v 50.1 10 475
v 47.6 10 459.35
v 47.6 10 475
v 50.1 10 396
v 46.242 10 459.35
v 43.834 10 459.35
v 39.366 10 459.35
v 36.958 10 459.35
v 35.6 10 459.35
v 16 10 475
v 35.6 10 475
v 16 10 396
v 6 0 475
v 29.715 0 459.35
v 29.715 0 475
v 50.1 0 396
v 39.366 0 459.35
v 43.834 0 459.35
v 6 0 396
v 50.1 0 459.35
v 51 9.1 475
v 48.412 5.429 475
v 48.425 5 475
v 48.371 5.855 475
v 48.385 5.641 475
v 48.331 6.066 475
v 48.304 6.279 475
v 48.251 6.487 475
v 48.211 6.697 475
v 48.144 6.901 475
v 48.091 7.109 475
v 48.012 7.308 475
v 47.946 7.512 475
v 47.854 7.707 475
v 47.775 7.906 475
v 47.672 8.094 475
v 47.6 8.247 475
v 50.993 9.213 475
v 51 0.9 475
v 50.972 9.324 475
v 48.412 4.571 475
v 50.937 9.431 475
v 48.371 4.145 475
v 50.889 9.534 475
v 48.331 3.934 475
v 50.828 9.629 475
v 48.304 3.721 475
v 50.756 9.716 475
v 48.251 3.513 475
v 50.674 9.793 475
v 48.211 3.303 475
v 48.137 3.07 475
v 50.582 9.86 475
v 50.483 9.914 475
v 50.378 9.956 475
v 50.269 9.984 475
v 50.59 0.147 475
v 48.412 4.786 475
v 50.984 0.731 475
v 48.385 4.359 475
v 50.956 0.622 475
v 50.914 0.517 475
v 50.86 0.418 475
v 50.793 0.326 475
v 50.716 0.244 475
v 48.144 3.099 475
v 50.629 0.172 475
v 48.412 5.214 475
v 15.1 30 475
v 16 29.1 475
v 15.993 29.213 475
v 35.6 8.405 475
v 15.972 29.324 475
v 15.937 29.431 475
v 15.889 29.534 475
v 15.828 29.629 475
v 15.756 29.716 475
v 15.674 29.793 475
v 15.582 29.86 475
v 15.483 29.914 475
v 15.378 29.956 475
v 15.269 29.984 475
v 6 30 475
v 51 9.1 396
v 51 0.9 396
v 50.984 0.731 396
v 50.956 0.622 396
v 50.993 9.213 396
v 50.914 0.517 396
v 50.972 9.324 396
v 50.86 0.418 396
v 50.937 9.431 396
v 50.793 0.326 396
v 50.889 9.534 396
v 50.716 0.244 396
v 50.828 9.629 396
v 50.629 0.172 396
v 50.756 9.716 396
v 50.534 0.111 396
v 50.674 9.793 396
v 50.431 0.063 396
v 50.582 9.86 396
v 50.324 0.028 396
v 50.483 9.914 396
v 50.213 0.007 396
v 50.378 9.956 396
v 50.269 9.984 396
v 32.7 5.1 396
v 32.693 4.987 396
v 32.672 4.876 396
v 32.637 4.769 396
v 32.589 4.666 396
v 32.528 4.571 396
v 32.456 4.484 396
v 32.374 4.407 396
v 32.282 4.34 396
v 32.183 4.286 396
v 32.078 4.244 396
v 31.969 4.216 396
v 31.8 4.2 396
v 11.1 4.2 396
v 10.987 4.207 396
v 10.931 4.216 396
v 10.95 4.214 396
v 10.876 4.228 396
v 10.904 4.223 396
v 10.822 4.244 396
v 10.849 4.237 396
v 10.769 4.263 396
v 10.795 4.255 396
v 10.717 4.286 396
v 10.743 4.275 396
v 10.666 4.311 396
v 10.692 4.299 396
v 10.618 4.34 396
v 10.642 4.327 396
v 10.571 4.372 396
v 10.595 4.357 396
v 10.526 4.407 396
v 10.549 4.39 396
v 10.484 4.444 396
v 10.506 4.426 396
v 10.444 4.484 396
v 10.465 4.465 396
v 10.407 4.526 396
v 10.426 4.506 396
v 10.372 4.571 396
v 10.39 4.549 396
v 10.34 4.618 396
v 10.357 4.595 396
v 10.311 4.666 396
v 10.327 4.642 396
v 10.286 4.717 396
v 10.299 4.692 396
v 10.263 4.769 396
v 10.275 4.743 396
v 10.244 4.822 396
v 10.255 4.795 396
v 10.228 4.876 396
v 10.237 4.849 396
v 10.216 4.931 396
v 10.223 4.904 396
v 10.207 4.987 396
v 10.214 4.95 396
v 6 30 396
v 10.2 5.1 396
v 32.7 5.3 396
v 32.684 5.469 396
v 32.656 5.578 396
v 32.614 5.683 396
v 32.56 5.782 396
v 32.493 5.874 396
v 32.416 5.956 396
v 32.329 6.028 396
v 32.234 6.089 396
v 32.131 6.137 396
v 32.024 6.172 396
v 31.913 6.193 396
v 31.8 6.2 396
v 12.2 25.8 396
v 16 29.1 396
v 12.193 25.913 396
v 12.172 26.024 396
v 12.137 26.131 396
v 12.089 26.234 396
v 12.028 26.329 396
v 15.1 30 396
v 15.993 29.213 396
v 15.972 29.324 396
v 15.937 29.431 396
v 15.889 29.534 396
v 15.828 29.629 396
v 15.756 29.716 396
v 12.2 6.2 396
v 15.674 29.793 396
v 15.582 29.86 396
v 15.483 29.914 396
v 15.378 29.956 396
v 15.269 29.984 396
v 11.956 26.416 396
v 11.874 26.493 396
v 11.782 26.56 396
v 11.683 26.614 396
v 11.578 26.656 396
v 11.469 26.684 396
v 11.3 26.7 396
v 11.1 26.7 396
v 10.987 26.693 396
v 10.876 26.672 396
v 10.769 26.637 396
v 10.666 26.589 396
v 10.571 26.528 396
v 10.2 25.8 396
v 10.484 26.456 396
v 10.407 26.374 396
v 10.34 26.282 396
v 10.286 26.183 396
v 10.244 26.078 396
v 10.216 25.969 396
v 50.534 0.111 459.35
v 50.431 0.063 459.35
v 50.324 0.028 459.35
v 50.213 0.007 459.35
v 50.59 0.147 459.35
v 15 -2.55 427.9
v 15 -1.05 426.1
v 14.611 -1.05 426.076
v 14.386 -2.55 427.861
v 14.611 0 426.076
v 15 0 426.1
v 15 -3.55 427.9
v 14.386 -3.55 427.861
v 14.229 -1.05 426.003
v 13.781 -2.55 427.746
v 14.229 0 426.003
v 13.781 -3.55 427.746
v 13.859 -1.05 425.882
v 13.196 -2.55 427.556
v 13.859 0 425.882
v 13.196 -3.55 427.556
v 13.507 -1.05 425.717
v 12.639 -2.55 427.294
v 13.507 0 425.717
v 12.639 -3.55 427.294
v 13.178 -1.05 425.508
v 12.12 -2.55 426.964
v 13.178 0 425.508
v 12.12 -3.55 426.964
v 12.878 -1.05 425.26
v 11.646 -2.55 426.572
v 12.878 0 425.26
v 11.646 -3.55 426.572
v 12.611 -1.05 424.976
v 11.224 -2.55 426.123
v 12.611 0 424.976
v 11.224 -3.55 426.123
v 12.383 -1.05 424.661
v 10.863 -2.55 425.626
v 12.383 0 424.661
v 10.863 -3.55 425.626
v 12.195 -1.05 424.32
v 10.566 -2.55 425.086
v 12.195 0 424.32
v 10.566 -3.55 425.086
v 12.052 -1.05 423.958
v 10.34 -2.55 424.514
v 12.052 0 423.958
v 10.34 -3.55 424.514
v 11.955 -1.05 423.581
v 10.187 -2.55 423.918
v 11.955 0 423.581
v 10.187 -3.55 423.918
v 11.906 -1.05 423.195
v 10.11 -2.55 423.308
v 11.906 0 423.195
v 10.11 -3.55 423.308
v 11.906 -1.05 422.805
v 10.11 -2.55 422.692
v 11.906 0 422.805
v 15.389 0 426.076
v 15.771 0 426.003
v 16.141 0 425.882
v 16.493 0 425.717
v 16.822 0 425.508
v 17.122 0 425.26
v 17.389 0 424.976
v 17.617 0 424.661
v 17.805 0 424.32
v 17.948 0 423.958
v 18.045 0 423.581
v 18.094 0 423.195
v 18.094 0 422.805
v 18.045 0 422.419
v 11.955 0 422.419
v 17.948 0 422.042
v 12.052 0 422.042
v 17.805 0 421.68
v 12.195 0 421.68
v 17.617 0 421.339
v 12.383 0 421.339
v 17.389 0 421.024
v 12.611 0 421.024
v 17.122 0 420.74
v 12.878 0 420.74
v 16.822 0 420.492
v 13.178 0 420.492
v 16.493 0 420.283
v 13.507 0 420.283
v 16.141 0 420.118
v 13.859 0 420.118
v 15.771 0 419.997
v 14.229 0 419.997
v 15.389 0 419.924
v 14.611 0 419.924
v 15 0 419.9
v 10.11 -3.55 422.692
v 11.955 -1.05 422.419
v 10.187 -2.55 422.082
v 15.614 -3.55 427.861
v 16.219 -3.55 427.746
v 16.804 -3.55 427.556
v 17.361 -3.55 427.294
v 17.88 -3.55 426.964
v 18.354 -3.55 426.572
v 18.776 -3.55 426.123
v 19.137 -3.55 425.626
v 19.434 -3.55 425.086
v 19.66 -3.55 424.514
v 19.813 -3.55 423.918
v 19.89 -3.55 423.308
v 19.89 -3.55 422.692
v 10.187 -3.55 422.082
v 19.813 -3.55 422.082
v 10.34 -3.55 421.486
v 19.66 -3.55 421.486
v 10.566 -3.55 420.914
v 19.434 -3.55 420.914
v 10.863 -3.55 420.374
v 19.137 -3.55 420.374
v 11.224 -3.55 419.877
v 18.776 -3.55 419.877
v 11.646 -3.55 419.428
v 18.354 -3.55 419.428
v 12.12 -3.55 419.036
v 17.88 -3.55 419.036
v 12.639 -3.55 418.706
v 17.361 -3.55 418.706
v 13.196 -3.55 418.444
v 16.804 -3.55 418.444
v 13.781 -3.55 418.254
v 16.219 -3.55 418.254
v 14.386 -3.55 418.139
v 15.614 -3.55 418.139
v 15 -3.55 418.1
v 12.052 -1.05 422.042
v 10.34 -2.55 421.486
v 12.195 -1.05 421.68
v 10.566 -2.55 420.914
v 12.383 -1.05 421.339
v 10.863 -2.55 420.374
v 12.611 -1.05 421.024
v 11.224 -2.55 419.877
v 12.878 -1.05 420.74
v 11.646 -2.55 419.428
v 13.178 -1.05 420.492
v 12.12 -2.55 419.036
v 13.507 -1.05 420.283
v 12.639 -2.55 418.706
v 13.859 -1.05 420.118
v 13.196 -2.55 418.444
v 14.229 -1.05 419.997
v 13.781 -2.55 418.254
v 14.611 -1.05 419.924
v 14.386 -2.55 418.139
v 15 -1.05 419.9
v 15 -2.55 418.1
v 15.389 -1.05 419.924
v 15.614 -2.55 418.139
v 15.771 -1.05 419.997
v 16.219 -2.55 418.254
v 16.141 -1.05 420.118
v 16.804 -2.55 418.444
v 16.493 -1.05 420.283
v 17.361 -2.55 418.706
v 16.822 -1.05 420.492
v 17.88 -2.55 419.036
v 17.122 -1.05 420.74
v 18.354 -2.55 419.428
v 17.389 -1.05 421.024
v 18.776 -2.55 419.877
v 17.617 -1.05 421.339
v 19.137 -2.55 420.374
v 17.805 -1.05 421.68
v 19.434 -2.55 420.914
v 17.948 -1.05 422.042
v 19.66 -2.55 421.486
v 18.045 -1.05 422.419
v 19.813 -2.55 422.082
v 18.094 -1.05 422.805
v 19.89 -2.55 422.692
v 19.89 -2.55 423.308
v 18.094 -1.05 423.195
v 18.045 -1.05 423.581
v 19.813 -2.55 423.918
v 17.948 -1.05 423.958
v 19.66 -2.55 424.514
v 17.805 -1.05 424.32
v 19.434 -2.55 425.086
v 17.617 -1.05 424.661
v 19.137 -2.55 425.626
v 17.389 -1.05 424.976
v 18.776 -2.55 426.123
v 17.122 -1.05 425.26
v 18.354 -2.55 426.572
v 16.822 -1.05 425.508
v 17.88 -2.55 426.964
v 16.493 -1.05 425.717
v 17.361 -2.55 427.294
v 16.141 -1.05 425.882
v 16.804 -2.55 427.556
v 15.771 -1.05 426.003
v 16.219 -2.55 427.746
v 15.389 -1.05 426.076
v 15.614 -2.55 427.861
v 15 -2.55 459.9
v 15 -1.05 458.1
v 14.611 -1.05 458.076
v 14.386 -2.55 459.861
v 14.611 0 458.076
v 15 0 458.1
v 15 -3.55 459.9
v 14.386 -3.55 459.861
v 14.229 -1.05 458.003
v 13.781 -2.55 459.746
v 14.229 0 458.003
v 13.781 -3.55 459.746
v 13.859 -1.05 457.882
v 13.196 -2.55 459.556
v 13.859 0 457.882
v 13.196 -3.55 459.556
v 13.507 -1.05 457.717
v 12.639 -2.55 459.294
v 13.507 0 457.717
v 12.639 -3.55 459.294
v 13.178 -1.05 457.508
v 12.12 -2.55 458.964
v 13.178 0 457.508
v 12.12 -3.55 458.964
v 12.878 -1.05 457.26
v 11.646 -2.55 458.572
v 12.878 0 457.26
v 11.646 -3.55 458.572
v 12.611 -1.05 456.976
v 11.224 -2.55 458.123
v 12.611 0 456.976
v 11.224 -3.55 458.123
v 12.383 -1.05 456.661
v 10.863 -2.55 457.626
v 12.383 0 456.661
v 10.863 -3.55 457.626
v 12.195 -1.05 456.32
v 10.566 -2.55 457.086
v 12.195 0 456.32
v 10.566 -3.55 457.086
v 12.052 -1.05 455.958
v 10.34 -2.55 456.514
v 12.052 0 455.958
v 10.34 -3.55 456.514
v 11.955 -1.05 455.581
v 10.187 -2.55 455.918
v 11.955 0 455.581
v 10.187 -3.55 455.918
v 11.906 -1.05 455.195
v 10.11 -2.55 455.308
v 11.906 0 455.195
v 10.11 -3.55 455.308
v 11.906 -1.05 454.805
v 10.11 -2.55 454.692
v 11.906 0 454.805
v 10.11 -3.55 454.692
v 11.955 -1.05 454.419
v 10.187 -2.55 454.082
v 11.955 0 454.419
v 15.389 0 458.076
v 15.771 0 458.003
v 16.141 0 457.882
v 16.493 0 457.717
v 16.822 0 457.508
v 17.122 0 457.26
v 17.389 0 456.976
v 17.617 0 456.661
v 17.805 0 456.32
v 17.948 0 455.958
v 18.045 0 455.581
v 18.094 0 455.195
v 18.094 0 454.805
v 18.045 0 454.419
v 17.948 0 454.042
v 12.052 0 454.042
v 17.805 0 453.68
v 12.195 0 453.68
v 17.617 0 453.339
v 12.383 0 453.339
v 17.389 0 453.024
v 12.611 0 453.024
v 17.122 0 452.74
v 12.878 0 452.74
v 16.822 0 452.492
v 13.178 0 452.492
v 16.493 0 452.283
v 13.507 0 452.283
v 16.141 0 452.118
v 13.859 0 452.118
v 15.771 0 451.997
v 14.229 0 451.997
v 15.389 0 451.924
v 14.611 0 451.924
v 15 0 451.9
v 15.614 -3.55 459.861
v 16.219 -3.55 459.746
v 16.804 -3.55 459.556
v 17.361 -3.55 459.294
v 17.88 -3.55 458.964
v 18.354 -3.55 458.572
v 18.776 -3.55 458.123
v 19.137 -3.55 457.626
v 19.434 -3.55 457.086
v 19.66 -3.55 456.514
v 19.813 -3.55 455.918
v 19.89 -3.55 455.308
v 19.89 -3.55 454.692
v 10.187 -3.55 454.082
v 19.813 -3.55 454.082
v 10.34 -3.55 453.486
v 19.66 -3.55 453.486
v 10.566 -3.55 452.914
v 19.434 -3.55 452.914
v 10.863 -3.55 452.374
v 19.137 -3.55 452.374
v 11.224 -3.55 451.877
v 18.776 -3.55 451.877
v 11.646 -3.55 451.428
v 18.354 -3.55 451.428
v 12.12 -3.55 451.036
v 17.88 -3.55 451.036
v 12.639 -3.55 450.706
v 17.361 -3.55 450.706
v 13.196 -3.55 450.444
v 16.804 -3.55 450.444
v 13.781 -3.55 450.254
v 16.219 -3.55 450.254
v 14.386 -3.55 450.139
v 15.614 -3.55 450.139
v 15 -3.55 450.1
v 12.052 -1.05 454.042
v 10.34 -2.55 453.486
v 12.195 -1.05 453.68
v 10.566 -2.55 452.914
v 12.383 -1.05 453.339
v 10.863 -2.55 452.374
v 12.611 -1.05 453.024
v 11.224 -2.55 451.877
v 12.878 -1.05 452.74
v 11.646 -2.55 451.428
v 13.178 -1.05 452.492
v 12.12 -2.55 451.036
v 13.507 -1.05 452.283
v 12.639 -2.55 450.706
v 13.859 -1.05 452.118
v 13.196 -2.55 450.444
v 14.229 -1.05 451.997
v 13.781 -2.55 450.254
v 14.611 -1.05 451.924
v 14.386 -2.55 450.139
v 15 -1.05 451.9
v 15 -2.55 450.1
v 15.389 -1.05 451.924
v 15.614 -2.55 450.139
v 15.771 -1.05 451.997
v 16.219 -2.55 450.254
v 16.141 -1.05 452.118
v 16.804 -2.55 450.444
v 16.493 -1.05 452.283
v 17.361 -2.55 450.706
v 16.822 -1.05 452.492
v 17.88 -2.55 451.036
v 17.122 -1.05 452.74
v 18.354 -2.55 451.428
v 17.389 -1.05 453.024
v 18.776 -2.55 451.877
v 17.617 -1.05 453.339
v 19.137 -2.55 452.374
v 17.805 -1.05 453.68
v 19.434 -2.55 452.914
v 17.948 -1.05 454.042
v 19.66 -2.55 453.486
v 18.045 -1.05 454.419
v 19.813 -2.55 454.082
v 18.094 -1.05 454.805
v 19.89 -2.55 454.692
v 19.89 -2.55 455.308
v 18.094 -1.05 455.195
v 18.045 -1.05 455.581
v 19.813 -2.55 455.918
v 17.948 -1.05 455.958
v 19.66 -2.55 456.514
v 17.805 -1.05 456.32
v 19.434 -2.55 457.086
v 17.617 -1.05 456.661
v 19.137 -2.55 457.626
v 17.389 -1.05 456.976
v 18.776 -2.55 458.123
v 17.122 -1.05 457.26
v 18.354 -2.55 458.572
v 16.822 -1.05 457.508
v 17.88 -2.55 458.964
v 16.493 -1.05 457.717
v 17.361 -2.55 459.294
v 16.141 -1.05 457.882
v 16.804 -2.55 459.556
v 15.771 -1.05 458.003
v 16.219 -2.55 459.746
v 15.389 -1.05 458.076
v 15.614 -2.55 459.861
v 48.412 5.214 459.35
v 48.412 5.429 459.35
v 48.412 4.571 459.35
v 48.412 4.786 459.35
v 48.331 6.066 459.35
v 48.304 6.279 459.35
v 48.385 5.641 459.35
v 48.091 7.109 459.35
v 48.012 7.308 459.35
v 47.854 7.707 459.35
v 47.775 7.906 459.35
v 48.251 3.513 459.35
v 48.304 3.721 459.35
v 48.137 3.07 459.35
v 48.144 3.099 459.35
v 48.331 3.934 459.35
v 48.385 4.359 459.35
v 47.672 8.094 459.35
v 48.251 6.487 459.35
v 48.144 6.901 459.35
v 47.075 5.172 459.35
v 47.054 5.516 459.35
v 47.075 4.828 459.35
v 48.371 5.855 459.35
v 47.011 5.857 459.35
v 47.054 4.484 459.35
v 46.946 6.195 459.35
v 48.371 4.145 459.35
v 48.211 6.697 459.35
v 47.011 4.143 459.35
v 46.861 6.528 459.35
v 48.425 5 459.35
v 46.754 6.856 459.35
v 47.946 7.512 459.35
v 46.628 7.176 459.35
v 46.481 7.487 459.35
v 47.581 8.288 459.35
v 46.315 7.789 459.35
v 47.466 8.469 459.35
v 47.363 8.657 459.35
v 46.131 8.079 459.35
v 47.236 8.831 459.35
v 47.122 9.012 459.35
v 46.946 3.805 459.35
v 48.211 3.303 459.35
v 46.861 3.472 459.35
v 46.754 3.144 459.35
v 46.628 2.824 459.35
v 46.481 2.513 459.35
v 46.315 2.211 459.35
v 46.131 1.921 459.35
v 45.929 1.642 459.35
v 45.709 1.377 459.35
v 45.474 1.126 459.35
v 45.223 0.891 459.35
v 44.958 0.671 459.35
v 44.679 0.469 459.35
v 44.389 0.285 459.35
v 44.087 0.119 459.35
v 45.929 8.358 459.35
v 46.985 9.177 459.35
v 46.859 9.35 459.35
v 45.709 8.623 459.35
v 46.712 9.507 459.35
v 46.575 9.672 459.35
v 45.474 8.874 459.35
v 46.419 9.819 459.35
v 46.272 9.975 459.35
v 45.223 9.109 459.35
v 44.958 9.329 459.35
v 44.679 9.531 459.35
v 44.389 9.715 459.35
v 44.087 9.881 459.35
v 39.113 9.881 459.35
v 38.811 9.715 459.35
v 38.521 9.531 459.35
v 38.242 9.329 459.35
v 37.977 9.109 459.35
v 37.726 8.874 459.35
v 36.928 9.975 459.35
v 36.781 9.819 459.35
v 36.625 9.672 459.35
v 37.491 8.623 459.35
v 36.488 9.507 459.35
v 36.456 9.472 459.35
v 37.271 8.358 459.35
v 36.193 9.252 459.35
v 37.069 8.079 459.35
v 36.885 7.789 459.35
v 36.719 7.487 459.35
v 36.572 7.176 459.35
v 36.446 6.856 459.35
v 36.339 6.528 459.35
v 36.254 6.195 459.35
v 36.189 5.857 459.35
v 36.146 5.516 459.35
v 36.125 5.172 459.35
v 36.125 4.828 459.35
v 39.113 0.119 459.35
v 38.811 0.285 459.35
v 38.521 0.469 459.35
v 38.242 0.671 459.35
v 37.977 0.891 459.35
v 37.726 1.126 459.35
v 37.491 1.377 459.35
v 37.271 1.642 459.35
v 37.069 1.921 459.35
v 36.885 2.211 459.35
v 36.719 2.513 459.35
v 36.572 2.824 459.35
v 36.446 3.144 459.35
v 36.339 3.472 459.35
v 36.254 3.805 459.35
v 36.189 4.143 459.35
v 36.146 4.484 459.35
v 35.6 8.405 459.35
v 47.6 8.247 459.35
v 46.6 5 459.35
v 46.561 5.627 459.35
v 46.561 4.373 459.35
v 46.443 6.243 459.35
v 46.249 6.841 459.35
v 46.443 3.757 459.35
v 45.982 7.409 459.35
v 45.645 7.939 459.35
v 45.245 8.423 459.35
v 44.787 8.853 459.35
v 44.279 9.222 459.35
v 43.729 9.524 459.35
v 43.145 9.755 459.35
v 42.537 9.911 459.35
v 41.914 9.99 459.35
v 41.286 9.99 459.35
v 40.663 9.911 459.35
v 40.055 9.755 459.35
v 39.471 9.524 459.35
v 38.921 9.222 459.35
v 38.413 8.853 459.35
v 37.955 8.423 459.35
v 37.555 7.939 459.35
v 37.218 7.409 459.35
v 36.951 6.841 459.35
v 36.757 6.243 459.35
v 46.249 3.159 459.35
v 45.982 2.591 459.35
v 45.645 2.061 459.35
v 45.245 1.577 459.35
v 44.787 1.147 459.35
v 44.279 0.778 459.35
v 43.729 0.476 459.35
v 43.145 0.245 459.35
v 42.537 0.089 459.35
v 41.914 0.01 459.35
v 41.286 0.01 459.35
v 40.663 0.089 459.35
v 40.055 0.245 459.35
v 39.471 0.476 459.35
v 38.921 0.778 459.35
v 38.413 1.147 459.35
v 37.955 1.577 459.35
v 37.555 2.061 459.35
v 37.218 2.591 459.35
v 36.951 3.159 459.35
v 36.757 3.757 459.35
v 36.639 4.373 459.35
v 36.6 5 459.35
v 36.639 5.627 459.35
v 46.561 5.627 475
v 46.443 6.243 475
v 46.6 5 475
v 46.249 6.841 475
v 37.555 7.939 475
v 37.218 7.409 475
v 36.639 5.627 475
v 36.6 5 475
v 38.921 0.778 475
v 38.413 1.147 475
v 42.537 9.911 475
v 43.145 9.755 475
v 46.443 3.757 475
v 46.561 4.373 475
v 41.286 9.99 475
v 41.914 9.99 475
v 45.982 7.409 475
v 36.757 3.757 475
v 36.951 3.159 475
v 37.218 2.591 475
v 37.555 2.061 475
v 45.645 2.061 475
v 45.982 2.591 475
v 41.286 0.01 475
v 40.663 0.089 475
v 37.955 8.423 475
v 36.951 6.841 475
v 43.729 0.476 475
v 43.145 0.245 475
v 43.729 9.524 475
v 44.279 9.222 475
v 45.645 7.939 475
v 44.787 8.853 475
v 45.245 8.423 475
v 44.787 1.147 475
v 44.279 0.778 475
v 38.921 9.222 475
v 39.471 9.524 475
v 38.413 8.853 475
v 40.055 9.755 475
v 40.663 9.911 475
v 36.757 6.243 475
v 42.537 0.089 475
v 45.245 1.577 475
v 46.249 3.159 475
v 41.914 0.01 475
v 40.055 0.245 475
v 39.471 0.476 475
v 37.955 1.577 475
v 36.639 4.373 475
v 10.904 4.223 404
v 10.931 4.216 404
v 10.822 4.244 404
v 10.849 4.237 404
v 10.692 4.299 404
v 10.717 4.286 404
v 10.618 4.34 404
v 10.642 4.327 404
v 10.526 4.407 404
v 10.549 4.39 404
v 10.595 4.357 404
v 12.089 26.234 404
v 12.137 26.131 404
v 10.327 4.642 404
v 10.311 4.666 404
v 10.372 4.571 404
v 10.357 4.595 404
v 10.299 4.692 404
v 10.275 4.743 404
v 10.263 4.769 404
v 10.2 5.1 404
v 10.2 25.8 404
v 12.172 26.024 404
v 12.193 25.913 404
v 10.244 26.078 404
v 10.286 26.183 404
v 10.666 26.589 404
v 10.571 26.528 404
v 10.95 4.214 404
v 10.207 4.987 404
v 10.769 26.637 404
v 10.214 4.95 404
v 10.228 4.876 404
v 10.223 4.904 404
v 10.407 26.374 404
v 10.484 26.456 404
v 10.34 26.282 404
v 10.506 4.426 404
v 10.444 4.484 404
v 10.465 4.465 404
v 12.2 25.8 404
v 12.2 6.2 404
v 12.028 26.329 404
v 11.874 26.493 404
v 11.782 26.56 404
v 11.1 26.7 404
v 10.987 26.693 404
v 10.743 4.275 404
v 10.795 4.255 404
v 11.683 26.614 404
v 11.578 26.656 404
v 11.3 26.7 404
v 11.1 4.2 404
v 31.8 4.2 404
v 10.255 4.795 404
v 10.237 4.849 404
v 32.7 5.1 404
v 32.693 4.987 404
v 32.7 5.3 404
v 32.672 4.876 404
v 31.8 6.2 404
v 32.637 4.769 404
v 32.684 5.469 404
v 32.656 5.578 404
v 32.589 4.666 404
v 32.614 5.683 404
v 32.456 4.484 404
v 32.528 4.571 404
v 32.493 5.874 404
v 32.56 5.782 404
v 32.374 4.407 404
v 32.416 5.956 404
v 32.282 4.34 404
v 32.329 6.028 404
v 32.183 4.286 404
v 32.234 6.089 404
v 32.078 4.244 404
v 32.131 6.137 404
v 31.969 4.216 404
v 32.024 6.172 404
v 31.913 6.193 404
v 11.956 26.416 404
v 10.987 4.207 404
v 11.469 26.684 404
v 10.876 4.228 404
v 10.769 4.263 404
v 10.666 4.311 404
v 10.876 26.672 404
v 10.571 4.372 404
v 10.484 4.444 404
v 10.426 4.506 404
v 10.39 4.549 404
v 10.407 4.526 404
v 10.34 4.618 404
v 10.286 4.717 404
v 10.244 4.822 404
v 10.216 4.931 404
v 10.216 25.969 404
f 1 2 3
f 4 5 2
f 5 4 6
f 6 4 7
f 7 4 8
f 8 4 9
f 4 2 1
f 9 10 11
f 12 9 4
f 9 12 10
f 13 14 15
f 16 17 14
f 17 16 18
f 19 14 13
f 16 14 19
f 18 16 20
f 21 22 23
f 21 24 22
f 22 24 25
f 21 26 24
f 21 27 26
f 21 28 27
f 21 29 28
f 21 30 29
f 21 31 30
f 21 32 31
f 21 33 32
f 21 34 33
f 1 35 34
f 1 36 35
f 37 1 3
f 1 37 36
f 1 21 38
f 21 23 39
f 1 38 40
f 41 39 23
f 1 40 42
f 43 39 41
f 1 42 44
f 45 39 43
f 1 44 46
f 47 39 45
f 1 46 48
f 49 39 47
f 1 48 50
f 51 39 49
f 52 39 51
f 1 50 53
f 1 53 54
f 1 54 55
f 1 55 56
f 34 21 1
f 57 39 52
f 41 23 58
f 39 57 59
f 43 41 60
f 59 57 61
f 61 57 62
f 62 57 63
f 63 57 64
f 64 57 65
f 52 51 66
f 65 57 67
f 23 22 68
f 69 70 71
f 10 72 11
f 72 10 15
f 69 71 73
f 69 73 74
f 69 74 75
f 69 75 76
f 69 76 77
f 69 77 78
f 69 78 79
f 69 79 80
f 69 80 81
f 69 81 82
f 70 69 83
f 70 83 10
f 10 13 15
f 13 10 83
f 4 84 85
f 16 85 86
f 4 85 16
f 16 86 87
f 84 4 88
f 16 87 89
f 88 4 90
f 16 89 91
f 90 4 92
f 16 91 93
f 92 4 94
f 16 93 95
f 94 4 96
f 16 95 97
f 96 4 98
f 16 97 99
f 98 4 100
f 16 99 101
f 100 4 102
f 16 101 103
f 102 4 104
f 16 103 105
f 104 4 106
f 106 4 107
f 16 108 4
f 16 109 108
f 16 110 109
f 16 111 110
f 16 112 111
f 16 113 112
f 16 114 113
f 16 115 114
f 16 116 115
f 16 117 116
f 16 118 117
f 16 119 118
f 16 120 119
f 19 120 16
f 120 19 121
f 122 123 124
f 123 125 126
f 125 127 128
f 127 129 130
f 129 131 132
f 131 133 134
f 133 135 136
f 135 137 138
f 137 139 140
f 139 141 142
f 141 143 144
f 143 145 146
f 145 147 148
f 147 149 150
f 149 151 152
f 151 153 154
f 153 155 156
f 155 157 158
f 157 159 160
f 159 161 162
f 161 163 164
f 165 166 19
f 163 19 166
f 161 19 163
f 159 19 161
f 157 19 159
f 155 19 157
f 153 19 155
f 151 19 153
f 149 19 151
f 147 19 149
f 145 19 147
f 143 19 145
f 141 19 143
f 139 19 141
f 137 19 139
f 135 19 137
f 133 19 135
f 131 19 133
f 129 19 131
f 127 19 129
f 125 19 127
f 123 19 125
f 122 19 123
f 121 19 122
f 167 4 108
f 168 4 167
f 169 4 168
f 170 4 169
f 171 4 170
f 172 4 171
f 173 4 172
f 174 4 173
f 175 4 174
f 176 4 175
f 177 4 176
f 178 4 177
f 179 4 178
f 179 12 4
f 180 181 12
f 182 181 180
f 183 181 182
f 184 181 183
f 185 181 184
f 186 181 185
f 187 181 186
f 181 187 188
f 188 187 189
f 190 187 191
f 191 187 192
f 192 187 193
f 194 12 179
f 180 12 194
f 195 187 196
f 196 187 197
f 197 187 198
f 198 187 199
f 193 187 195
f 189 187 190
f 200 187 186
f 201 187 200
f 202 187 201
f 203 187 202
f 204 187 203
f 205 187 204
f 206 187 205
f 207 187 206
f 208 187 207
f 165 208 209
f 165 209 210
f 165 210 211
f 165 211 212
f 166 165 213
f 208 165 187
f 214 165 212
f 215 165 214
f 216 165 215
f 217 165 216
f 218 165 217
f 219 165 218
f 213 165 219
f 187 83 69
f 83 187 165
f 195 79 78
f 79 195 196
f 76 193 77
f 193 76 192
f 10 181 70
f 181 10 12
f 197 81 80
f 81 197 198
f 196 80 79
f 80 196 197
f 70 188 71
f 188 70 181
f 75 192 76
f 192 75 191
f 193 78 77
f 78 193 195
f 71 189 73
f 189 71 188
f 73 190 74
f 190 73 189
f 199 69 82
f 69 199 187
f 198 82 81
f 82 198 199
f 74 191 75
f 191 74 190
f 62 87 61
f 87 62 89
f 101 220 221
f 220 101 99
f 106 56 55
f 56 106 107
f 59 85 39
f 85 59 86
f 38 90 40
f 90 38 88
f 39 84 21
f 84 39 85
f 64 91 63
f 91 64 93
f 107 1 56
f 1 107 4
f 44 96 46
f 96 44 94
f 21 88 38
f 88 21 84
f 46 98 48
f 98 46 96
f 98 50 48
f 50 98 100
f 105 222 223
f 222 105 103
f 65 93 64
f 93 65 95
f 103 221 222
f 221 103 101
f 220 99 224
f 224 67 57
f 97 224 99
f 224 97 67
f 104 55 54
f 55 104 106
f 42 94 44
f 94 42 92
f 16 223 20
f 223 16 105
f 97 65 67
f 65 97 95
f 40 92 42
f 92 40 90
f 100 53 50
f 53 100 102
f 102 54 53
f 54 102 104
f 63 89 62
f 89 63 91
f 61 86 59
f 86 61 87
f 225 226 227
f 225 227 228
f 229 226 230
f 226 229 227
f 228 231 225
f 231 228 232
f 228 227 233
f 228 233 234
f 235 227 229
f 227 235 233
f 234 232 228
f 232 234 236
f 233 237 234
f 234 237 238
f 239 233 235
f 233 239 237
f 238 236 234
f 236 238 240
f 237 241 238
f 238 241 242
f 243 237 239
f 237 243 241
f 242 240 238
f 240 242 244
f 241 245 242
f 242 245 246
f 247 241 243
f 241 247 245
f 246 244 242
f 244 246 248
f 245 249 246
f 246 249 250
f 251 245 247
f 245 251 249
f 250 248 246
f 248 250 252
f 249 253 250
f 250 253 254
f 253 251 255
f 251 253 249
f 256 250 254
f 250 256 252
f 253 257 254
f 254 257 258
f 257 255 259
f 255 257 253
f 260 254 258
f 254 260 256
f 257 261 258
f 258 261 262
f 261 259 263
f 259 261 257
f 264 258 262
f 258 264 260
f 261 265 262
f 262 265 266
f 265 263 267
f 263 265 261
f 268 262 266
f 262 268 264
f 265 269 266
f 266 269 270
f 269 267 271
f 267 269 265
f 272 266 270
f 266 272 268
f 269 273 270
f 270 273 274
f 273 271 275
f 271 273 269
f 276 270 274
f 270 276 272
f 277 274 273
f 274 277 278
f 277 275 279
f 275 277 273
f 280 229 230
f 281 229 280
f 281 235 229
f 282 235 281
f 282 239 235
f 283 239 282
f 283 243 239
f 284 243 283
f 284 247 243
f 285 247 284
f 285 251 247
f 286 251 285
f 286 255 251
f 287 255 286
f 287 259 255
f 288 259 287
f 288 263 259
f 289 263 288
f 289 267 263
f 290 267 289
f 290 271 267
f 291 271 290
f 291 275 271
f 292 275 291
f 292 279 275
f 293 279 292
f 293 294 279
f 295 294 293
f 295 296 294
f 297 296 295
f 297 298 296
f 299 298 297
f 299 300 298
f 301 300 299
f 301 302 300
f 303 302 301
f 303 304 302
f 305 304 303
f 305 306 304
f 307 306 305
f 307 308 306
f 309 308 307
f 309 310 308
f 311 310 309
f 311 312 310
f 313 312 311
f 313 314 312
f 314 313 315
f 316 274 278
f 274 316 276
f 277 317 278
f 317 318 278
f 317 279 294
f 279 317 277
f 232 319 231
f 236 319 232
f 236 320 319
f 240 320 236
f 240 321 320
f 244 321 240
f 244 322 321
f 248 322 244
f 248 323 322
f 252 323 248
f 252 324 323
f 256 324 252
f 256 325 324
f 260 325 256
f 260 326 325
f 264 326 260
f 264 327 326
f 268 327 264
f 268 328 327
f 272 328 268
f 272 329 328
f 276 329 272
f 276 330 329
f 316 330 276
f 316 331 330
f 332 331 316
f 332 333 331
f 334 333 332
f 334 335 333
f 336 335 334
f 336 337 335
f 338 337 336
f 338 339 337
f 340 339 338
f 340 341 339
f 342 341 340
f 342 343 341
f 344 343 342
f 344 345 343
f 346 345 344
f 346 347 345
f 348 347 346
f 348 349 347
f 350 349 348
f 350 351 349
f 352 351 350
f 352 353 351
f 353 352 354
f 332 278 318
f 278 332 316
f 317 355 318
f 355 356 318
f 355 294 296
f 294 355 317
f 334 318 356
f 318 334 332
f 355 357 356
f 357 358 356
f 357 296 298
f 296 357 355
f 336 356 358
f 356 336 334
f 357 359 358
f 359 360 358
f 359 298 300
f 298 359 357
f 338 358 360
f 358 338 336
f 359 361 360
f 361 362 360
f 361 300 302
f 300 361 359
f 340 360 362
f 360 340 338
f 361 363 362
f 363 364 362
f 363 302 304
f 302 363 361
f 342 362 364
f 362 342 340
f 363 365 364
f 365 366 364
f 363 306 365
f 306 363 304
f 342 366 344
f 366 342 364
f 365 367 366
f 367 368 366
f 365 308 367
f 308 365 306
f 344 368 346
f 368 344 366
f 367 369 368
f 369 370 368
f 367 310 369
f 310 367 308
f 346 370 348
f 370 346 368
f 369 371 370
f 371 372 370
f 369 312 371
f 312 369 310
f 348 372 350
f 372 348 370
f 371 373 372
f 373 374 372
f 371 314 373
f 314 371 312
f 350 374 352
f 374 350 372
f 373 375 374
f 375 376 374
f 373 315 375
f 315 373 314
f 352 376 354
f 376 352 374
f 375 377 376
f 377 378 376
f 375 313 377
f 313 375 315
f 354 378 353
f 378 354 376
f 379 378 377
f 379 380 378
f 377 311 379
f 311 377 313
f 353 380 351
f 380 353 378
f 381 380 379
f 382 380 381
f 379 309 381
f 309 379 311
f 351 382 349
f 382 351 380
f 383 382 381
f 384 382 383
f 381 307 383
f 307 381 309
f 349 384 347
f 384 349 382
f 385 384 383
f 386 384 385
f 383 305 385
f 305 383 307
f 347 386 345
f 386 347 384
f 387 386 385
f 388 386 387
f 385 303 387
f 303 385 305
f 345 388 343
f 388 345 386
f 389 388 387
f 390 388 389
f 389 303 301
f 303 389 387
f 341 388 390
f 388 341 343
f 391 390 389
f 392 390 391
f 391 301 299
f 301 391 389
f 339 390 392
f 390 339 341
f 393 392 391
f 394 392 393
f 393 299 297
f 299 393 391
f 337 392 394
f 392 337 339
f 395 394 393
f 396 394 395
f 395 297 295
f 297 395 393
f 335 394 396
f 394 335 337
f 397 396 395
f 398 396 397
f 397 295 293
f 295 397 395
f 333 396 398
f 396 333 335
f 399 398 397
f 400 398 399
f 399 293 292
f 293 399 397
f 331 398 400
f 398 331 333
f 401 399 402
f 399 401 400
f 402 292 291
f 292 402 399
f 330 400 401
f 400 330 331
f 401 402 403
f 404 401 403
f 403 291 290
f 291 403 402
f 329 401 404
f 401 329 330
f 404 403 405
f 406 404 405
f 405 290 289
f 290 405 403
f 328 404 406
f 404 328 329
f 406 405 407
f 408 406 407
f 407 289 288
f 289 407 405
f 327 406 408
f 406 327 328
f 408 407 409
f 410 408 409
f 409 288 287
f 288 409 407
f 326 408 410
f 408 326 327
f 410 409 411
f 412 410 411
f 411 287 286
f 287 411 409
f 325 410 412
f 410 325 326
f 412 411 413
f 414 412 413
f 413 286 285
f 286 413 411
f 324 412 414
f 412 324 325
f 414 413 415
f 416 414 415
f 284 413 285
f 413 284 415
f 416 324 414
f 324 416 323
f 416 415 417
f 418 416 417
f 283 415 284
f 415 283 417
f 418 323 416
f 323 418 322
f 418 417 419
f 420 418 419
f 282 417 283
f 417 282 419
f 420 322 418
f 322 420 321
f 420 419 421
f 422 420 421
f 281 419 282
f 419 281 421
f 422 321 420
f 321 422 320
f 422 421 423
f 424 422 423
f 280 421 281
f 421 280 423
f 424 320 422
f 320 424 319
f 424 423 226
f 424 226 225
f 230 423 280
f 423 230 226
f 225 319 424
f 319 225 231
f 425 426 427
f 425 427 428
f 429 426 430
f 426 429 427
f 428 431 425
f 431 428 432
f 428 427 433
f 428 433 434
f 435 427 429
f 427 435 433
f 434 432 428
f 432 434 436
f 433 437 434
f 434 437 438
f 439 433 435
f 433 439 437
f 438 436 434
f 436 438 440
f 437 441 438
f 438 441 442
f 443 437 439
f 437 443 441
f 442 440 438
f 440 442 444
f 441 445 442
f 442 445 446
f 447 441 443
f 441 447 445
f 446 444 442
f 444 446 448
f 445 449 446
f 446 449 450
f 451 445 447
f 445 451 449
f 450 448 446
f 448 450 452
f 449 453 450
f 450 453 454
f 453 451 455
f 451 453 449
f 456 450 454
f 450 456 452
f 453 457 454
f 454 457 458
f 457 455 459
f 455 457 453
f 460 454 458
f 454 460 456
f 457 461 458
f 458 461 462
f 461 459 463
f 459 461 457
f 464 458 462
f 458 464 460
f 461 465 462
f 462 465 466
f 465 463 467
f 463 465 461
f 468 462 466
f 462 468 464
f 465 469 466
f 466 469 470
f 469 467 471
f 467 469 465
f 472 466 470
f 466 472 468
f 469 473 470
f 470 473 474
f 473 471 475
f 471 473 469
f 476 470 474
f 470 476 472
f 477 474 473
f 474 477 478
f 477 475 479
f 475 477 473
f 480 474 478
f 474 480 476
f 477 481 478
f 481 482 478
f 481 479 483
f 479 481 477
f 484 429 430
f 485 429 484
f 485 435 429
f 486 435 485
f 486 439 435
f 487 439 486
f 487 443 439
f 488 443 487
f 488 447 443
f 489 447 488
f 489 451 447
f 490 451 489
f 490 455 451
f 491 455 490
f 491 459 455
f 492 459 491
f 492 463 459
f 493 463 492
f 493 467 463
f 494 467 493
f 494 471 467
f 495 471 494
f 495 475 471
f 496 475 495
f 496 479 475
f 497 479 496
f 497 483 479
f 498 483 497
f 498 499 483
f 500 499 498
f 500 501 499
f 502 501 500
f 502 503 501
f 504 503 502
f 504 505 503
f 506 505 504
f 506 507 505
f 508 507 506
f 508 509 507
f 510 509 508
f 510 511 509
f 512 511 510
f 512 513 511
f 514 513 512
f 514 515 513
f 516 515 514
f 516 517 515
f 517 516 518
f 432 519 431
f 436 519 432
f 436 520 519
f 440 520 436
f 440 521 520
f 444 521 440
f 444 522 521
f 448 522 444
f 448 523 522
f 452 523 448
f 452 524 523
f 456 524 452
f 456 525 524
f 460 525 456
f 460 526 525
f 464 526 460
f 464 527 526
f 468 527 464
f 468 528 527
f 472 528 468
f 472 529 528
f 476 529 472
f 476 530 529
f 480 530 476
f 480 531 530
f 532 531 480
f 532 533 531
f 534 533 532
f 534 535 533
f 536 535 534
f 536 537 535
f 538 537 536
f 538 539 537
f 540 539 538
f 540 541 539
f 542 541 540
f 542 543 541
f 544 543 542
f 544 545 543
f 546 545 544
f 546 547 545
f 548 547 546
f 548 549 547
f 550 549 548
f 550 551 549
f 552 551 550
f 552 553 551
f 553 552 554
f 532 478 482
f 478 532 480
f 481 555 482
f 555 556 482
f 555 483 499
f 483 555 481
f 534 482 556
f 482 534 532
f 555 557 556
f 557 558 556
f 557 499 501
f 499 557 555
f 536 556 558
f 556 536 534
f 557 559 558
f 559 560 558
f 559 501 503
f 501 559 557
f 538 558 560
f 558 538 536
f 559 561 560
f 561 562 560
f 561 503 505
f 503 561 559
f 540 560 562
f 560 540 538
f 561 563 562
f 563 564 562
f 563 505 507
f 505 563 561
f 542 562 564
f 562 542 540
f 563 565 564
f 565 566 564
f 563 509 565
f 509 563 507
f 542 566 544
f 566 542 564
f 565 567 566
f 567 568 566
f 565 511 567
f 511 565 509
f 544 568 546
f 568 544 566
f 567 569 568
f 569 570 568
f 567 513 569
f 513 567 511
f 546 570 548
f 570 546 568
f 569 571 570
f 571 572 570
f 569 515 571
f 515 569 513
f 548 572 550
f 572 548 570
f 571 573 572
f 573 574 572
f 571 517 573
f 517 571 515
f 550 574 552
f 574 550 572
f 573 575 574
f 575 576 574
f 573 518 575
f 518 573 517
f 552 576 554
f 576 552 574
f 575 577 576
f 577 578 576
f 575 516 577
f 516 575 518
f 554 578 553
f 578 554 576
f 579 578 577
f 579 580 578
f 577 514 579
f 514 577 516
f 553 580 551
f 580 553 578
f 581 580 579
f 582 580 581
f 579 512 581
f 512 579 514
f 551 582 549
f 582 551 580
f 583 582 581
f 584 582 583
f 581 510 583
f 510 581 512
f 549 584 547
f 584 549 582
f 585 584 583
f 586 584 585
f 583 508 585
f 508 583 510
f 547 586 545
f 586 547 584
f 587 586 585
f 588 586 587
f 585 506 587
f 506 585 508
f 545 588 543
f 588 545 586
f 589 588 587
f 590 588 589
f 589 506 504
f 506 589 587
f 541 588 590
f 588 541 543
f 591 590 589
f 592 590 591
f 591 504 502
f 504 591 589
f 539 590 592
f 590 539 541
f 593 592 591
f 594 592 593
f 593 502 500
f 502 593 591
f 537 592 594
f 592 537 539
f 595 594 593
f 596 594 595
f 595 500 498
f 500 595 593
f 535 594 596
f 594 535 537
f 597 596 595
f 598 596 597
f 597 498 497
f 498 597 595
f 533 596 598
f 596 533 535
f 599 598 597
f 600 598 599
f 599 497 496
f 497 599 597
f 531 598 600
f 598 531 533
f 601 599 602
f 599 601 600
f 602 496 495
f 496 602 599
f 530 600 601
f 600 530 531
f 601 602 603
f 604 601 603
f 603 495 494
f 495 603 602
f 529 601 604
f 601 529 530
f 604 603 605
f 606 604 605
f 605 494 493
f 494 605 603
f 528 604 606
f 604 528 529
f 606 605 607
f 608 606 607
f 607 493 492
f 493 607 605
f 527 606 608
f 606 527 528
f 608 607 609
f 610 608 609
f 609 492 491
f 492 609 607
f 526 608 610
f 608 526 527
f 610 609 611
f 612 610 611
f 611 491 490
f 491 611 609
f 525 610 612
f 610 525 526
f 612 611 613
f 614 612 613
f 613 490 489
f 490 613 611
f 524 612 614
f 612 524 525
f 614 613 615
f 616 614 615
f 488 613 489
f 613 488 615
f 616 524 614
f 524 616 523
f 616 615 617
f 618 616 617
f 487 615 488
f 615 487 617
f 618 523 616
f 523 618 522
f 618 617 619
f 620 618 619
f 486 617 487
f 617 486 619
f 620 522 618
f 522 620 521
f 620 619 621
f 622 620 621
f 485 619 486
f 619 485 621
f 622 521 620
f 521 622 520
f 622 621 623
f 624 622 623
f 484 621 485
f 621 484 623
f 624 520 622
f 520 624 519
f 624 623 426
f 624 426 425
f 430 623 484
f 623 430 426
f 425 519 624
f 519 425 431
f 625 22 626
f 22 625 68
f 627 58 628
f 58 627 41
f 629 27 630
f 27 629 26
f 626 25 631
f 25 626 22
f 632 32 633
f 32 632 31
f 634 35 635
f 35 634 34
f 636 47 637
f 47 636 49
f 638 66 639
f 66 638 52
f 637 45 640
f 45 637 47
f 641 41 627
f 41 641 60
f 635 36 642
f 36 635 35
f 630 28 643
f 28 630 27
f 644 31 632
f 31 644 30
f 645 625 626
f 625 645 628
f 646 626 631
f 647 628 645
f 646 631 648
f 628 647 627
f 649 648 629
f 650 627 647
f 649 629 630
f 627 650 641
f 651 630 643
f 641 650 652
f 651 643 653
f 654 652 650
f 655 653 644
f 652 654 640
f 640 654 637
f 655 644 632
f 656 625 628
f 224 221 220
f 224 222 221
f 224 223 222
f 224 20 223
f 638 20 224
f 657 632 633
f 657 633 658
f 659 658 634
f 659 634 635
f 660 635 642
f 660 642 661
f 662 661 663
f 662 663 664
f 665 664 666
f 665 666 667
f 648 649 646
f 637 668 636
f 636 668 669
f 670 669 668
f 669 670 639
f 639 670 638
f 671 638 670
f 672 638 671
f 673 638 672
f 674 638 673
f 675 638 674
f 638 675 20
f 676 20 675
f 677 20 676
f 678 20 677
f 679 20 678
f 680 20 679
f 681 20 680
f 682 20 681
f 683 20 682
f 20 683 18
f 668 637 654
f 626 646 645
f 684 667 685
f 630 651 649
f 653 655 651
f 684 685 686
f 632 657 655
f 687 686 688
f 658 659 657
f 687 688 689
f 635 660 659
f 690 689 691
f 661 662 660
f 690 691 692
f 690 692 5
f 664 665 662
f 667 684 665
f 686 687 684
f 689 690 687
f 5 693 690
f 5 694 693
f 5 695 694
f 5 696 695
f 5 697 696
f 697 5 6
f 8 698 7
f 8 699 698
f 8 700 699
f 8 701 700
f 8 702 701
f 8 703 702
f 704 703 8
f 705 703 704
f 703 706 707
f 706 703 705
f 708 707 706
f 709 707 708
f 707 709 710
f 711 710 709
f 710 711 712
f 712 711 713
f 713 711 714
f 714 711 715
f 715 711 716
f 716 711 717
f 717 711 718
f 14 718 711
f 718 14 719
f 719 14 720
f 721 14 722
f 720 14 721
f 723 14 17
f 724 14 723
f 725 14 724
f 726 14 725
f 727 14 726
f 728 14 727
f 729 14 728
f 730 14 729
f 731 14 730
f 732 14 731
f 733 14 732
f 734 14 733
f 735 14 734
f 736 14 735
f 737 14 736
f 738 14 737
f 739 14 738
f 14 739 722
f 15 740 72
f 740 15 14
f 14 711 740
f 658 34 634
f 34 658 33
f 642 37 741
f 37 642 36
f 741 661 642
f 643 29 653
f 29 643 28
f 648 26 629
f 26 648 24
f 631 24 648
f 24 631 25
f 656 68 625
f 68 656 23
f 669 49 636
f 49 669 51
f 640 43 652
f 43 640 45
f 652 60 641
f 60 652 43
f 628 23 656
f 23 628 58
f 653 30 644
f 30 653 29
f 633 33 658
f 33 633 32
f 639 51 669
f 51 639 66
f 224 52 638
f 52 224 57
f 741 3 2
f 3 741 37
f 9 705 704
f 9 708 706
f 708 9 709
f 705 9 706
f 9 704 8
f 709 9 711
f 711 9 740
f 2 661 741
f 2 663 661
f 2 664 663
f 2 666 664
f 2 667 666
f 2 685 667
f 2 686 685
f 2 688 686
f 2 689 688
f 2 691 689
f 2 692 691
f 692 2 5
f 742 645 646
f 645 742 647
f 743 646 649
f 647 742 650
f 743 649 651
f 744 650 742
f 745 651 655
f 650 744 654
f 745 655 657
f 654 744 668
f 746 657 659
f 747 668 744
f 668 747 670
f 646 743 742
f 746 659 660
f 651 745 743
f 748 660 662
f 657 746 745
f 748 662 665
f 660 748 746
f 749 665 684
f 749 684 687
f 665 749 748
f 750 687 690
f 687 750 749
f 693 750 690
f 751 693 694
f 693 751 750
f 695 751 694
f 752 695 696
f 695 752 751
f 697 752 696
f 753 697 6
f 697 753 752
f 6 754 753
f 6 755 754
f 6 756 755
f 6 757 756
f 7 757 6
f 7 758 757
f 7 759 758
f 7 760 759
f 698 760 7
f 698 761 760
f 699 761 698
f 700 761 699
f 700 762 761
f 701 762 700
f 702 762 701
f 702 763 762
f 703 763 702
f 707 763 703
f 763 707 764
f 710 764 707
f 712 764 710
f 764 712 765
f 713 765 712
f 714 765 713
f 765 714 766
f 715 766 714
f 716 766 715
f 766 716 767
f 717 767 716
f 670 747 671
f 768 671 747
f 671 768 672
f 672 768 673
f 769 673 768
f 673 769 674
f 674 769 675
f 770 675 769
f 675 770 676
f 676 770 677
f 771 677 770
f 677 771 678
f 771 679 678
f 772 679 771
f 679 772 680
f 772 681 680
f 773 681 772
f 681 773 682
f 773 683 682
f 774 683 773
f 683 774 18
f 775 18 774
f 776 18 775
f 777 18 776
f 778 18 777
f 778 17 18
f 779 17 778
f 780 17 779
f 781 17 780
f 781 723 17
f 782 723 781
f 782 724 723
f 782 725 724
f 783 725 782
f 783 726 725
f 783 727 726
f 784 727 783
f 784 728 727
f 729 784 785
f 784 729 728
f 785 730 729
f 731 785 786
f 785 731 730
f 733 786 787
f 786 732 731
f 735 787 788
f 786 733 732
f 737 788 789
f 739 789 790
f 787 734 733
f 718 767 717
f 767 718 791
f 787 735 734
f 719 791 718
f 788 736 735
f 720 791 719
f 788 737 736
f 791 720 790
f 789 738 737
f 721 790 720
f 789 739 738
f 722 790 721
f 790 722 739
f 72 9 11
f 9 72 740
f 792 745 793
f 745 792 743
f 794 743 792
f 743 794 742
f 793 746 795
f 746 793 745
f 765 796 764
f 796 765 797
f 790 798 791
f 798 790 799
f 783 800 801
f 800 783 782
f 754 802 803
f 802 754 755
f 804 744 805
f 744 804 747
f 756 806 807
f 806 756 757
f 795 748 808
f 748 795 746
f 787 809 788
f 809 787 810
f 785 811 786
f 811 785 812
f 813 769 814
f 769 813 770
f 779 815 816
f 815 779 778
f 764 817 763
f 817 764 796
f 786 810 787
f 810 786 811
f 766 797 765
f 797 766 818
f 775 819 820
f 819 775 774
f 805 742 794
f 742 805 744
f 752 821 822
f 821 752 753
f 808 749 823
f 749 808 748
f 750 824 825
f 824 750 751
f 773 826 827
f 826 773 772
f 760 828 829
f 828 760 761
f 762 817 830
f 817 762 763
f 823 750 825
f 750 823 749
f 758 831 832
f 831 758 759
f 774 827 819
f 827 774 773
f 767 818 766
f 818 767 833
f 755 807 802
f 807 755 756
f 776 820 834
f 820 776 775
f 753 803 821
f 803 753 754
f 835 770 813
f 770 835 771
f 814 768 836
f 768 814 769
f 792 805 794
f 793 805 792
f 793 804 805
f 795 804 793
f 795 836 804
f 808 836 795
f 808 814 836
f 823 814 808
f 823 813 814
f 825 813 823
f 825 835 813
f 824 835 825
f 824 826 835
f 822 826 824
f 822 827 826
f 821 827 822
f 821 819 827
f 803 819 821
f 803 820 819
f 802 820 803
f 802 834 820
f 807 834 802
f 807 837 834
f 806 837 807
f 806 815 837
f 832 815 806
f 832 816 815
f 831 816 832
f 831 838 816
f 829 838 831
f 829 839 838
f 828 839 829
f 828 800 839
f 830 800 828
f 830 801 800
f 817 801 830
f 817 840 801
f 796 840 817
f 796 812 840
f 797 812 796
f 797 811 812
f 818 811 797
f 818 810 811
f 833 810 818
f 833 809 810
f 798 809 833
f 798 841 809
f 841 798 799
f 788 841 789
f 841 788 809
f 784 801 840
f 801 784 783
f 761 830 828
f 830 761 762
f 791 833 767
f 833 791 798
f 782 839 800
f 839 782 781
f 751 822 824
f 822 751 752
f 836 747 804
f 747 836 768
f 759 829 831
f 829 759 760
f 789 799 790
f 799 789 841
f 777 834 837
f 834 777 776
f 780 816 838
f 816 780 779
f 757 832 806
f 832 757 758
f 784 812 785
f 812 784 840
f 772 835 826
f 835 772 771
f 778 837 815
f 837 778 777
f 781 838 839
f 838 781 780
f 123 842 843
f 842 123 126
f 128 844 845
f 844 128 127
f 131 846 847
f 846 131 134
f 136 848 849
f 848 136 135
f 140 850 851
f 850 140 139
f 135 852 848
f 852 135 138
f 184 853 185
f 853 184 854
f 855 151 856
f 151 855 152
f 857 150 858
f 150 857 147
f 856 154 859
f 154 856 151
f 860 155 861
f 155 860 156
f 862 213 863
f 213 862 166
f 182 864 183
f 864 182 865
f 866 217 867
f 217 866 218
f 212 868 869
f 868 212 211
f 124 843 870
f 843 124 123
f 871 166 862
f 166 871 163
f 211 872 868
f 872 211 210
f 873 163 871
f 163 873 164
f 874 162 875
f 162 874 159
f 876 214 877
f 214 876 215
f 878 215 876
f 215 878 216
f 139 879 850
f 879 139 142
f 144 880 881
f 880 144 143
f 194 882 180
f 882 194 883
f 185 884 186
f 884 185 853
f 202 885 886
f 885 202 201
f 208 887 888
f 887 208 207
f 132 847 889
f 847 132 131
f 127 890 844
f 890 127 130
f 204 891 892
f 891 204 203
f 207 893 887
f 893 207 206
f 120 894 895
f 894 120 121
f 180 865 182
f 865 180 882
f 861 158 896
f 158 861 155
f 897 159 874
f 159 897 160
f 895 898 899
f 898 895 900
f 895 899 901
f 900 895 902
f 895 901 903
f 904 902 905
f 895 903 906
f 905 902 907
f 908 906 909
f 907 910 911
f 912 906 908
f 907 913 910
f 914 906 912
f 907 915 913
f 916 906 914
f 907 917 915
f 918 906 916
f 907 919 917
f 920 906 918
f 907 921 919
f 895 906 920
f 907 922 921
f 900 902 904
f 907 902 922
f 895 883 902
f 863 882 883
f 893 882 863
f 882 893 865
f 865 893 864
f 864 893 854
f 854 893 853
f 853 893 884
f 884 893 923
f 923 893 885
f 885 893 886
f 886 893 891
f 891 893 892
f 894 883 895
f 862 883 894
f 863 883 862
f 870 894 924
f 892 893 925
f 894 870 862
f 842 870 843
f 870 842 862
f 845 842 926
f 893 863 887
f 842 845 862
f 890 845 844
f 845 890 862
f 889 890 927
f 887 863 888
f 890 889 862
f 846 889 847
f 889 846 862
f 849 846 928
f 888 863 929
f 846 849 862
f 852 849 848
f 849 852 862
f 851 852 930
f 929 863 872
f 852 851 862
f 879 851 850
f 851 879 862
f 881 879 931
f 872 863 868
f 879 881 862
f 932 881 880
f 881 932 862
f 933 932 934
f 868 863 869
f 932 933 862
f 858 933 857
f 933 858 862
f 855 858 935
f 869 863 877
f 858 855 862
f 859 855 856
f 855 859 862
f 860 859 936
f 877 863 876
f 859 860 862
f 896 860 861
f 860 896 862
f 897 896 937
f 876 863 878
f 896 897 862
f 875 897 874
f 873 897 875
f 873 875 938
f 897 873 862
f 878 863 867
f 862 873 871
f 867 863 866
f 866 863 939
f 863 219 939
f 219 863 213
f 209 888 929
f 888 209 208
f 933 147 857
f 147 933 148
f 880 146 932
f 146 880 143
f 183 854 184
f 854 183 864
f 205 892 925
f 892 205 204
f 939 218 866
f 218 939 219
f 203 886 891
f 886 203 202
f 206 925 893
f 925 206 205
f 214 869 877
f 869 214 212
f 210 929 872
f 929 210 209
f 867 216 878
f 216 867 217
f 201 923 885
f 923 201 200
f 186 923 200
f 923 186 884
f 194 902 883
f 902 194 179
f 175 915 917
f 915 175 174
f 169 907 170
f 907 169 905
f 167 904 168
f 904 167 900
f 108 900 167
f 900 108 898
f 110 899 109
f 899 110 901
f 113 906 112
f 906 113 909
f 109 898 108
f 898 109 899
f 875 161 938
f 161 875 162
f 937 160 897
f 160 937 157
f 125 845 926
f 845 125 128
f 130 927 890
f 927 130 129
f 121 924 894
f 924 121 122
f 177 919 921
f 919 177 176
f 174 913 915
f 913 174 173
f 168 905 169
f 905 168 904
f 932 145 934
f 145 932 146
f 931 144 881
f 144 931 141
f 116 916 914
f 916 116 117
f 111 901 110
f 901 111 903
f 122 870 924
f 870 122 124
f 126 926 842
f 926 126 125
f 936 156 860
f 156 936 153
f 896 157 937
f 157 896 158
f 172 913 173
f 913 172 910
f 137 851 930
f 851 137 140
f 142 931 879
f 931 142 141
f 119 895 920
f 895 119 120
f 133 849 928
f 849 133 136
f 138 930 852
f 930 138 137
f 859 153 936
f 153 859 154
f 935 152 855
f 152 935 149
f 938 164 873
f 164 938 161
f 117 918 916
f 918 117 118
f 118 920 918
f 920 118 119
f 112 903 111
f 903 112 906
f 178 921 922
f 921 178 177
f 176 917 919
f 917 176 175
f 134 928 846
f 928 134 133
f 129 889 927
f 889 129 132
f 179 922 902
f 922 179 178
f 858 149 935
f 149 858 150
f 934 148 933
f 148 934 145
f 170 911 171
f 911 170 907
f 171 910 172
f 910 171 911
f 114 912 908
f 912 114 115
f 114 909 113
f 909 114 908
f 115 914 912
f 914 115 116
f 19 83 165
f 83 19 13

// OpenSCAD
// file: construction.scad
/*
Specialized construction functions specifically for the enclosure.
By combining these operators the various instances of enclosure pieces 
can be constructed.
*/
include <parameters.scad>;
use <utility.scad>;

module lug() {
    ra = knob_diameter/2;
    rb = lug_diameter/2;
    rotate([0,90,90]) 
        rotate_extrude()
            color("DarkSeaGreen")
            polygon([[0,0],[0,lug_height],[rb,lug_height],
                [rb,2.5],[ra,1],[ra,0]]);
}

// extend the corner frame to be symmetrical with the front corner
module extend_frame_x(height=frame_corner_height) {
    union() {
        children();
        color("SteelBlue")
        translate([hinge_inner_diameter*2, hinge_inner_diameter,0]) 
            rotate([0,0,-90])
                frame( hinge_inner_diameter*3+1, 
                    height, hinge_inner_diameter, 
                    corner_roundness );
    }
}

module frame( width, height, thickness, roundness ) {
        linear_extrude(height=height)
            apply_roundness(roundness, $fs =0.01) 
                    square( [thickness, width] );
}

module frame_corner( width, height, thickness, roundness ) {    
    union() {
        mirror([0,1,0]) 
            rotate([0,0,-90])
                frame( width, height, thickness, roundness );
        frame( width, height, thickness + panel_thickness, roundness );
    }   
}

module frame_connector_corner(clearance=0) {
    translate([panel_thickness*1.7,panel_thickness*0.70, 0]) 
        cornerize()
            frame( frame_corner_width*0.75, frame_connector_depth, 
                frame_thickness*.20+clearance, corner_roundness );
        
}

module add_lugs() {   
    union() {
        children();
        translate([lug_offset_x,-lug_height,lug_offset_z]) 
            lug();
        translate([lug_offset_x,-lug_height, lug_offset_z+lug_offset_gap])
            lug(); 
    } 
}

module add_connector(height=frame_corner_height) {
    union() {
        children();

        color("SteelBlue")
        translate([0,0,height])
            frame_connector_corner();
    }
}

module add_hinge_post( top=false ) {
    union() {
        difference() {
            children();

            // create a negative space that snuggly fits the hinge
            translate([frame_corner_width+plastic_thickness+hinge_gap,
                hinge_inner_diameter/2, (top?frame_corner_height:0)])
                mirror(top?[0,0,1]:[0,0,0])
                    union() {
                         height = hinge_height-hinge_inner_diameter;
                        translate([0,0,height/2]) 
                            cube([hinge_inner_diameter+2,
                                hinge_inner_diameter+2,height+1.3],true);
                        // hinge open
                        rotate([0,0,-90]) translate([0,0,-0.1]) scale(1.05) hinge();
                        // hinge closed
                        rotate([0,0,0]) translate([0,0,-0.1]) scale(1.05) hinge();
                    }
            
        }
        color("SteelBlue")
        translate([frame_corner_width+plastic_thickness+hinge_gap,hinge_inner_diameter/2,0])
            cylinder(d=hinge_inner_diameter, frame_corner_height);
    }
}

module add_outside_frame( height ) {
    union() {
        children();
        translate([-plastic_thickness,-plastic_thickness,0])
            color("SteelBlue")
            frame( frame_corner_width+plastic_thickness, height, frame_thickness,
                corner_roundness);
        translate([14.5,0.05,height/2])
            color("SteelBlue")
            rotate([0,0,8])
            cube([frame_corner_width/2,plastic_thickness,height],true);
    }
}

module hinge() {
    height = hinge_height-hinge_inner_diameter;
    width = hinge_inner_diameter+hinge_ring_thickness;
    difference() {
        
        // create the base shape for the hinge
        union() {    
            cylinder(d=width, height);
            
            translate([hinge_inner_diameter*3+hinge_clearance,
                -hinge_offset,height/2-plastic_thickness/2]) 
                cube([hinge_length,hinge_thickness,
                    height+plastic_thickness],true);
           
            translate([2.52,-5.2,height/2]) 
                rotate([0,0,40]) 
                    cube([hinge_inner_diameter,
                        width+1,height],true);
        }
        
        // remove a hole for the hinge post to slide into
        cylinder(d=hinge_inner_diameter+tolerance_smooth, height+1);
        
        // trim the left corner
        translate([4,-17.5,height/2-1]) 
            rotate([0,0,145]) 
                cube([50,width-2,height+3],true);
        
        // smooth the tranistion to the bottom edge
        translate([32,-10,height/2-18.25]) 
            rotate([-88.5,0.1,96]) 
                cube([40,20,60],true);
        
        // add a chamfer to right corner
        translate([hinge_length+8,0,height+25]) 
            rotate([0,45,0]) 
            cube(50,true);
    }   
}

module add_connector_slot() {
    difference() {
        children();
        frame_connector_corner(tolerance_tight);
    }
}

module frame_vertical() {
    add_connector_slot()
    add_connector(frame_vertical_height)
    extend_frame_x(frame_vertical_height)
        frame_corner( frame_corner_width, 
            frame_vertical_height, frame_thickness, 
            corner_roundness );          
}

module grip() {
    rotate([90,90,90])
        color("DarkSeaGreen")
        frame(plastic_thickness,plastic_thickness,plastic_thickness,corner_roundness);
}

module add_snap_lock_slot(top=false) {
    difference() {
        children();
        translate([0,0,top?frame_corner_height+shelf_height:-shelf_height])
            mirror(top?[0,0,1]:[0,0,0])
                 snaplock(tolerance_tight,top);
    }
}

module lug2(clearance) {
    color("DarkSeaGreen")
    rotate([90,0,0])
            frame(frame_connector_depth+clearance,snaplock_connector_size/2,
                connector_thickness+clearance,corner_roundness);
}

module snaplock(clearance=0,top=false) {
    height = shelf_height+snaplock_connector_size+plastic_thickness+clearance;
    union() {
        color("Magenta")
        difference() {
            translate([snaplock_size,-snaplock_thickness*3,-plastic_thickness])
                rotate([0,0,90])
                    frame(snaplock_size+clearance,height,
                        snaplock_width*2+plastic_thickness, corner_roundness);
            fix_preview2() cube([snaplock_size*1.1,snaplock_width+plastic_thickness,shelf_height]);
        }

        // grips at top
        translate([5,1,shelf_height+1.5]) grip();
        translate([18,1,shelf_height+1.5]) grip();

        // grips at bottom
        translate([5,1,0.5]) grip();
        translate([18,1,0.5]) grip();

        // connector lugs
        translate([3*snaplock_size/4-connector_thickness/2-clearance/2,
            frame_connector_depth+snaplock_thickness,
            shelf_height+snaplock_connector_size/2 - (snaplock_connector_size/4)-clearance/2])
            lug2(clearance);

        translate([(top?2:1)*snaplock_size/4-connector_thickness/2-clearance/2,
            frame_connector_depth+snaplock_thickness,
            shelf_height+snaplock_connector_size/2 - (snaplock_connector_size/4)-clearance/2])
            lug2(clearance);
    }
}
// file: support.scad
/*
Provides support objects that are used to model the environment of the enclosure
to ensure the pieces slot together and fit properly.
*/
include <parameters.scad>;
use <utility.scad>;

module wall_panel() {
    cube([panel_height,panel_width,panel_thickness]);
}

module door_panel() {
     cube([door_panel_width,door_panel_height,door_panel_thickness]);
}

module left_wall_panel() {
    translate([panel_thickness,0,panel_offset_z]) 
        rotate([0,-90,0]) 
            wall_panel();
}

module back_wall_panel() {
    translate([(enclosure_width-panel_width)/2,
            enclosure_depth-panel_thickness-plastic_thickness,
            0]) 
        rotate([-90,-90,0]) 
            wall_panel();
}

module right_wall_panel() {
    translate([enclosure_width,0,panel_offset_z]) 
        rotate([0,-90,0]) 
            wall_panel();
}

module left_door(open=false) {
    translate([frame_corner_width+plastic_thickness+hinge_gap,
            hinge_inner_diameter/2,0]) 
        rotate([90,0,open?-90:0]) 
            translate([door_hinge_offset,0,hinge_offset-
                    door_panel_thickness/2])
                door_panel();
}

module right_door(open=false) {
    translate([enclosure_width,0,0])  
        mirror([1,0,0]) left_door(open);
}
// file: utility.scad
/*
Generically useful utility functions.
*/

// applies roundness without altering dimensions of object
module apply_roundness(r)
    offset(r) offset(delta=-r) children(0);

// makes a corner piece by mirroring and rotating one side
module cornerize() {
    union() {
        children(0);
        mirror([0,1,0]) 
            rotate([0,0,-90])
                children(0);
    }
} 

module explode(vector) {
    for(i=[0:$children-1])
        translate(vector*i)
            children(i);

}

/*
 The fix_preview series of functions are used to make small
 translations in order to reduce conincident plane artifacts
 from the preview mode. 

 It would be nice to have just one module for this but I haven't
 figured out a way of doing this generically - so the following
 uses a small translation in different directions depending on
 the use case needed.
*/
module fix_preview() {
    translate($preview?[-0.001,-0.001,-0.001]:[0,0,0])
        children(0);
}

module fix_preview2() {
    translate($preview?[-0.001,0.001,-0.001]:[0,0,0])
        children(0);
}

module fix_preview3() {
    translate($preview?[-0.001,0.001,0.001]:[0,0,0])
        children(0);
}
// file: parameters.scad
$fn=50;

// Wall thickness and tolerance
plastic_thickness=2.0;
tolerance_smooth=0.45;
tolerance_tight=0.40;
corner_roundness=0.9;

// Specify enclosure dimensions
enclosure_height=475.0;
enclosure_depth=535.0;

// Wall panel dimensions
panel_thickness=6.0;
panel_height=450.0;
panel_width=535.0;
panel_offset_z = enclosure_height - panel_height;

// Door panel dimensions
door_panel_thickness=3.0;
door_panel_width=250.0;
door_panel_height=475.0;
door_hinge_offset=6.5;

// Frame
frame_corner_width=30.0;
frame_corner_height=79.0;
frame_thickness = plastic_thickness*2 + panel_thickness;
frame_side = (enclosure_height - frame_corner_height*2)/2;
frame_clip_height=50.5;
frame_vertical_height = (enclosure_height-frame_corner_height*2)/2;
frame_connector_depth = 8.0;

// Lug
knob_diameter=9.8;
lug_diameter=6.2;
lug_gap=1.4;
lug_height = lug_gap+2.15;
lug_offset_x=15.0;
lug_offset_z=27.0;
lug_offset_gap=32;

// Snaplock
shelf_height=50.3+tolerance_tight;
snaplock_width=5+tolerance_tight;
snaplock_size=25;
snaplock_thickness=plastic_thickness;
snaplock_connector_size=15;
connector_thickness=frame_thickness*.4;

// Door hinge
hinge_inner_diameter=10;
hinge_height=25;
hinge_length=53;
hinge_gap = 9.6;
hinge_clearance = 1.5;
hinge_ring_thickness=3.0;
hinge_thickness=plastic_thickness*2 + door_panel_thickness;
hinge_offset=6.5+plastic_thickness;

enclosure_width=2*(frame_corner_width+plastic_thickness+hinge_gap
    +door_hinge_offset) + door_panel_width*2 +tolerance_smooth;
// main file
include <parameters.scad>
use <utility.scad>
use <support.scad>
use <construction.scad>

module front_left_top_corner() {
    difference() {
        translate([0,0,enclosure_height-frame_corner_height]) 
            difference() {
                add_hinge_post(top=true) 
                add_lugs() 
                extend_frame_x()
                    color("SteelBlue")
                    frame_corner( frame_corner_width, 
                        frame_corner_height,frame_thickness, 
                        corner_roundness);
                frame_connector_corner();
            }
        fix_preview() left_wall_panel();
    }
}

%fix_preview() left_wall_panel();
front_left_top_corner();
